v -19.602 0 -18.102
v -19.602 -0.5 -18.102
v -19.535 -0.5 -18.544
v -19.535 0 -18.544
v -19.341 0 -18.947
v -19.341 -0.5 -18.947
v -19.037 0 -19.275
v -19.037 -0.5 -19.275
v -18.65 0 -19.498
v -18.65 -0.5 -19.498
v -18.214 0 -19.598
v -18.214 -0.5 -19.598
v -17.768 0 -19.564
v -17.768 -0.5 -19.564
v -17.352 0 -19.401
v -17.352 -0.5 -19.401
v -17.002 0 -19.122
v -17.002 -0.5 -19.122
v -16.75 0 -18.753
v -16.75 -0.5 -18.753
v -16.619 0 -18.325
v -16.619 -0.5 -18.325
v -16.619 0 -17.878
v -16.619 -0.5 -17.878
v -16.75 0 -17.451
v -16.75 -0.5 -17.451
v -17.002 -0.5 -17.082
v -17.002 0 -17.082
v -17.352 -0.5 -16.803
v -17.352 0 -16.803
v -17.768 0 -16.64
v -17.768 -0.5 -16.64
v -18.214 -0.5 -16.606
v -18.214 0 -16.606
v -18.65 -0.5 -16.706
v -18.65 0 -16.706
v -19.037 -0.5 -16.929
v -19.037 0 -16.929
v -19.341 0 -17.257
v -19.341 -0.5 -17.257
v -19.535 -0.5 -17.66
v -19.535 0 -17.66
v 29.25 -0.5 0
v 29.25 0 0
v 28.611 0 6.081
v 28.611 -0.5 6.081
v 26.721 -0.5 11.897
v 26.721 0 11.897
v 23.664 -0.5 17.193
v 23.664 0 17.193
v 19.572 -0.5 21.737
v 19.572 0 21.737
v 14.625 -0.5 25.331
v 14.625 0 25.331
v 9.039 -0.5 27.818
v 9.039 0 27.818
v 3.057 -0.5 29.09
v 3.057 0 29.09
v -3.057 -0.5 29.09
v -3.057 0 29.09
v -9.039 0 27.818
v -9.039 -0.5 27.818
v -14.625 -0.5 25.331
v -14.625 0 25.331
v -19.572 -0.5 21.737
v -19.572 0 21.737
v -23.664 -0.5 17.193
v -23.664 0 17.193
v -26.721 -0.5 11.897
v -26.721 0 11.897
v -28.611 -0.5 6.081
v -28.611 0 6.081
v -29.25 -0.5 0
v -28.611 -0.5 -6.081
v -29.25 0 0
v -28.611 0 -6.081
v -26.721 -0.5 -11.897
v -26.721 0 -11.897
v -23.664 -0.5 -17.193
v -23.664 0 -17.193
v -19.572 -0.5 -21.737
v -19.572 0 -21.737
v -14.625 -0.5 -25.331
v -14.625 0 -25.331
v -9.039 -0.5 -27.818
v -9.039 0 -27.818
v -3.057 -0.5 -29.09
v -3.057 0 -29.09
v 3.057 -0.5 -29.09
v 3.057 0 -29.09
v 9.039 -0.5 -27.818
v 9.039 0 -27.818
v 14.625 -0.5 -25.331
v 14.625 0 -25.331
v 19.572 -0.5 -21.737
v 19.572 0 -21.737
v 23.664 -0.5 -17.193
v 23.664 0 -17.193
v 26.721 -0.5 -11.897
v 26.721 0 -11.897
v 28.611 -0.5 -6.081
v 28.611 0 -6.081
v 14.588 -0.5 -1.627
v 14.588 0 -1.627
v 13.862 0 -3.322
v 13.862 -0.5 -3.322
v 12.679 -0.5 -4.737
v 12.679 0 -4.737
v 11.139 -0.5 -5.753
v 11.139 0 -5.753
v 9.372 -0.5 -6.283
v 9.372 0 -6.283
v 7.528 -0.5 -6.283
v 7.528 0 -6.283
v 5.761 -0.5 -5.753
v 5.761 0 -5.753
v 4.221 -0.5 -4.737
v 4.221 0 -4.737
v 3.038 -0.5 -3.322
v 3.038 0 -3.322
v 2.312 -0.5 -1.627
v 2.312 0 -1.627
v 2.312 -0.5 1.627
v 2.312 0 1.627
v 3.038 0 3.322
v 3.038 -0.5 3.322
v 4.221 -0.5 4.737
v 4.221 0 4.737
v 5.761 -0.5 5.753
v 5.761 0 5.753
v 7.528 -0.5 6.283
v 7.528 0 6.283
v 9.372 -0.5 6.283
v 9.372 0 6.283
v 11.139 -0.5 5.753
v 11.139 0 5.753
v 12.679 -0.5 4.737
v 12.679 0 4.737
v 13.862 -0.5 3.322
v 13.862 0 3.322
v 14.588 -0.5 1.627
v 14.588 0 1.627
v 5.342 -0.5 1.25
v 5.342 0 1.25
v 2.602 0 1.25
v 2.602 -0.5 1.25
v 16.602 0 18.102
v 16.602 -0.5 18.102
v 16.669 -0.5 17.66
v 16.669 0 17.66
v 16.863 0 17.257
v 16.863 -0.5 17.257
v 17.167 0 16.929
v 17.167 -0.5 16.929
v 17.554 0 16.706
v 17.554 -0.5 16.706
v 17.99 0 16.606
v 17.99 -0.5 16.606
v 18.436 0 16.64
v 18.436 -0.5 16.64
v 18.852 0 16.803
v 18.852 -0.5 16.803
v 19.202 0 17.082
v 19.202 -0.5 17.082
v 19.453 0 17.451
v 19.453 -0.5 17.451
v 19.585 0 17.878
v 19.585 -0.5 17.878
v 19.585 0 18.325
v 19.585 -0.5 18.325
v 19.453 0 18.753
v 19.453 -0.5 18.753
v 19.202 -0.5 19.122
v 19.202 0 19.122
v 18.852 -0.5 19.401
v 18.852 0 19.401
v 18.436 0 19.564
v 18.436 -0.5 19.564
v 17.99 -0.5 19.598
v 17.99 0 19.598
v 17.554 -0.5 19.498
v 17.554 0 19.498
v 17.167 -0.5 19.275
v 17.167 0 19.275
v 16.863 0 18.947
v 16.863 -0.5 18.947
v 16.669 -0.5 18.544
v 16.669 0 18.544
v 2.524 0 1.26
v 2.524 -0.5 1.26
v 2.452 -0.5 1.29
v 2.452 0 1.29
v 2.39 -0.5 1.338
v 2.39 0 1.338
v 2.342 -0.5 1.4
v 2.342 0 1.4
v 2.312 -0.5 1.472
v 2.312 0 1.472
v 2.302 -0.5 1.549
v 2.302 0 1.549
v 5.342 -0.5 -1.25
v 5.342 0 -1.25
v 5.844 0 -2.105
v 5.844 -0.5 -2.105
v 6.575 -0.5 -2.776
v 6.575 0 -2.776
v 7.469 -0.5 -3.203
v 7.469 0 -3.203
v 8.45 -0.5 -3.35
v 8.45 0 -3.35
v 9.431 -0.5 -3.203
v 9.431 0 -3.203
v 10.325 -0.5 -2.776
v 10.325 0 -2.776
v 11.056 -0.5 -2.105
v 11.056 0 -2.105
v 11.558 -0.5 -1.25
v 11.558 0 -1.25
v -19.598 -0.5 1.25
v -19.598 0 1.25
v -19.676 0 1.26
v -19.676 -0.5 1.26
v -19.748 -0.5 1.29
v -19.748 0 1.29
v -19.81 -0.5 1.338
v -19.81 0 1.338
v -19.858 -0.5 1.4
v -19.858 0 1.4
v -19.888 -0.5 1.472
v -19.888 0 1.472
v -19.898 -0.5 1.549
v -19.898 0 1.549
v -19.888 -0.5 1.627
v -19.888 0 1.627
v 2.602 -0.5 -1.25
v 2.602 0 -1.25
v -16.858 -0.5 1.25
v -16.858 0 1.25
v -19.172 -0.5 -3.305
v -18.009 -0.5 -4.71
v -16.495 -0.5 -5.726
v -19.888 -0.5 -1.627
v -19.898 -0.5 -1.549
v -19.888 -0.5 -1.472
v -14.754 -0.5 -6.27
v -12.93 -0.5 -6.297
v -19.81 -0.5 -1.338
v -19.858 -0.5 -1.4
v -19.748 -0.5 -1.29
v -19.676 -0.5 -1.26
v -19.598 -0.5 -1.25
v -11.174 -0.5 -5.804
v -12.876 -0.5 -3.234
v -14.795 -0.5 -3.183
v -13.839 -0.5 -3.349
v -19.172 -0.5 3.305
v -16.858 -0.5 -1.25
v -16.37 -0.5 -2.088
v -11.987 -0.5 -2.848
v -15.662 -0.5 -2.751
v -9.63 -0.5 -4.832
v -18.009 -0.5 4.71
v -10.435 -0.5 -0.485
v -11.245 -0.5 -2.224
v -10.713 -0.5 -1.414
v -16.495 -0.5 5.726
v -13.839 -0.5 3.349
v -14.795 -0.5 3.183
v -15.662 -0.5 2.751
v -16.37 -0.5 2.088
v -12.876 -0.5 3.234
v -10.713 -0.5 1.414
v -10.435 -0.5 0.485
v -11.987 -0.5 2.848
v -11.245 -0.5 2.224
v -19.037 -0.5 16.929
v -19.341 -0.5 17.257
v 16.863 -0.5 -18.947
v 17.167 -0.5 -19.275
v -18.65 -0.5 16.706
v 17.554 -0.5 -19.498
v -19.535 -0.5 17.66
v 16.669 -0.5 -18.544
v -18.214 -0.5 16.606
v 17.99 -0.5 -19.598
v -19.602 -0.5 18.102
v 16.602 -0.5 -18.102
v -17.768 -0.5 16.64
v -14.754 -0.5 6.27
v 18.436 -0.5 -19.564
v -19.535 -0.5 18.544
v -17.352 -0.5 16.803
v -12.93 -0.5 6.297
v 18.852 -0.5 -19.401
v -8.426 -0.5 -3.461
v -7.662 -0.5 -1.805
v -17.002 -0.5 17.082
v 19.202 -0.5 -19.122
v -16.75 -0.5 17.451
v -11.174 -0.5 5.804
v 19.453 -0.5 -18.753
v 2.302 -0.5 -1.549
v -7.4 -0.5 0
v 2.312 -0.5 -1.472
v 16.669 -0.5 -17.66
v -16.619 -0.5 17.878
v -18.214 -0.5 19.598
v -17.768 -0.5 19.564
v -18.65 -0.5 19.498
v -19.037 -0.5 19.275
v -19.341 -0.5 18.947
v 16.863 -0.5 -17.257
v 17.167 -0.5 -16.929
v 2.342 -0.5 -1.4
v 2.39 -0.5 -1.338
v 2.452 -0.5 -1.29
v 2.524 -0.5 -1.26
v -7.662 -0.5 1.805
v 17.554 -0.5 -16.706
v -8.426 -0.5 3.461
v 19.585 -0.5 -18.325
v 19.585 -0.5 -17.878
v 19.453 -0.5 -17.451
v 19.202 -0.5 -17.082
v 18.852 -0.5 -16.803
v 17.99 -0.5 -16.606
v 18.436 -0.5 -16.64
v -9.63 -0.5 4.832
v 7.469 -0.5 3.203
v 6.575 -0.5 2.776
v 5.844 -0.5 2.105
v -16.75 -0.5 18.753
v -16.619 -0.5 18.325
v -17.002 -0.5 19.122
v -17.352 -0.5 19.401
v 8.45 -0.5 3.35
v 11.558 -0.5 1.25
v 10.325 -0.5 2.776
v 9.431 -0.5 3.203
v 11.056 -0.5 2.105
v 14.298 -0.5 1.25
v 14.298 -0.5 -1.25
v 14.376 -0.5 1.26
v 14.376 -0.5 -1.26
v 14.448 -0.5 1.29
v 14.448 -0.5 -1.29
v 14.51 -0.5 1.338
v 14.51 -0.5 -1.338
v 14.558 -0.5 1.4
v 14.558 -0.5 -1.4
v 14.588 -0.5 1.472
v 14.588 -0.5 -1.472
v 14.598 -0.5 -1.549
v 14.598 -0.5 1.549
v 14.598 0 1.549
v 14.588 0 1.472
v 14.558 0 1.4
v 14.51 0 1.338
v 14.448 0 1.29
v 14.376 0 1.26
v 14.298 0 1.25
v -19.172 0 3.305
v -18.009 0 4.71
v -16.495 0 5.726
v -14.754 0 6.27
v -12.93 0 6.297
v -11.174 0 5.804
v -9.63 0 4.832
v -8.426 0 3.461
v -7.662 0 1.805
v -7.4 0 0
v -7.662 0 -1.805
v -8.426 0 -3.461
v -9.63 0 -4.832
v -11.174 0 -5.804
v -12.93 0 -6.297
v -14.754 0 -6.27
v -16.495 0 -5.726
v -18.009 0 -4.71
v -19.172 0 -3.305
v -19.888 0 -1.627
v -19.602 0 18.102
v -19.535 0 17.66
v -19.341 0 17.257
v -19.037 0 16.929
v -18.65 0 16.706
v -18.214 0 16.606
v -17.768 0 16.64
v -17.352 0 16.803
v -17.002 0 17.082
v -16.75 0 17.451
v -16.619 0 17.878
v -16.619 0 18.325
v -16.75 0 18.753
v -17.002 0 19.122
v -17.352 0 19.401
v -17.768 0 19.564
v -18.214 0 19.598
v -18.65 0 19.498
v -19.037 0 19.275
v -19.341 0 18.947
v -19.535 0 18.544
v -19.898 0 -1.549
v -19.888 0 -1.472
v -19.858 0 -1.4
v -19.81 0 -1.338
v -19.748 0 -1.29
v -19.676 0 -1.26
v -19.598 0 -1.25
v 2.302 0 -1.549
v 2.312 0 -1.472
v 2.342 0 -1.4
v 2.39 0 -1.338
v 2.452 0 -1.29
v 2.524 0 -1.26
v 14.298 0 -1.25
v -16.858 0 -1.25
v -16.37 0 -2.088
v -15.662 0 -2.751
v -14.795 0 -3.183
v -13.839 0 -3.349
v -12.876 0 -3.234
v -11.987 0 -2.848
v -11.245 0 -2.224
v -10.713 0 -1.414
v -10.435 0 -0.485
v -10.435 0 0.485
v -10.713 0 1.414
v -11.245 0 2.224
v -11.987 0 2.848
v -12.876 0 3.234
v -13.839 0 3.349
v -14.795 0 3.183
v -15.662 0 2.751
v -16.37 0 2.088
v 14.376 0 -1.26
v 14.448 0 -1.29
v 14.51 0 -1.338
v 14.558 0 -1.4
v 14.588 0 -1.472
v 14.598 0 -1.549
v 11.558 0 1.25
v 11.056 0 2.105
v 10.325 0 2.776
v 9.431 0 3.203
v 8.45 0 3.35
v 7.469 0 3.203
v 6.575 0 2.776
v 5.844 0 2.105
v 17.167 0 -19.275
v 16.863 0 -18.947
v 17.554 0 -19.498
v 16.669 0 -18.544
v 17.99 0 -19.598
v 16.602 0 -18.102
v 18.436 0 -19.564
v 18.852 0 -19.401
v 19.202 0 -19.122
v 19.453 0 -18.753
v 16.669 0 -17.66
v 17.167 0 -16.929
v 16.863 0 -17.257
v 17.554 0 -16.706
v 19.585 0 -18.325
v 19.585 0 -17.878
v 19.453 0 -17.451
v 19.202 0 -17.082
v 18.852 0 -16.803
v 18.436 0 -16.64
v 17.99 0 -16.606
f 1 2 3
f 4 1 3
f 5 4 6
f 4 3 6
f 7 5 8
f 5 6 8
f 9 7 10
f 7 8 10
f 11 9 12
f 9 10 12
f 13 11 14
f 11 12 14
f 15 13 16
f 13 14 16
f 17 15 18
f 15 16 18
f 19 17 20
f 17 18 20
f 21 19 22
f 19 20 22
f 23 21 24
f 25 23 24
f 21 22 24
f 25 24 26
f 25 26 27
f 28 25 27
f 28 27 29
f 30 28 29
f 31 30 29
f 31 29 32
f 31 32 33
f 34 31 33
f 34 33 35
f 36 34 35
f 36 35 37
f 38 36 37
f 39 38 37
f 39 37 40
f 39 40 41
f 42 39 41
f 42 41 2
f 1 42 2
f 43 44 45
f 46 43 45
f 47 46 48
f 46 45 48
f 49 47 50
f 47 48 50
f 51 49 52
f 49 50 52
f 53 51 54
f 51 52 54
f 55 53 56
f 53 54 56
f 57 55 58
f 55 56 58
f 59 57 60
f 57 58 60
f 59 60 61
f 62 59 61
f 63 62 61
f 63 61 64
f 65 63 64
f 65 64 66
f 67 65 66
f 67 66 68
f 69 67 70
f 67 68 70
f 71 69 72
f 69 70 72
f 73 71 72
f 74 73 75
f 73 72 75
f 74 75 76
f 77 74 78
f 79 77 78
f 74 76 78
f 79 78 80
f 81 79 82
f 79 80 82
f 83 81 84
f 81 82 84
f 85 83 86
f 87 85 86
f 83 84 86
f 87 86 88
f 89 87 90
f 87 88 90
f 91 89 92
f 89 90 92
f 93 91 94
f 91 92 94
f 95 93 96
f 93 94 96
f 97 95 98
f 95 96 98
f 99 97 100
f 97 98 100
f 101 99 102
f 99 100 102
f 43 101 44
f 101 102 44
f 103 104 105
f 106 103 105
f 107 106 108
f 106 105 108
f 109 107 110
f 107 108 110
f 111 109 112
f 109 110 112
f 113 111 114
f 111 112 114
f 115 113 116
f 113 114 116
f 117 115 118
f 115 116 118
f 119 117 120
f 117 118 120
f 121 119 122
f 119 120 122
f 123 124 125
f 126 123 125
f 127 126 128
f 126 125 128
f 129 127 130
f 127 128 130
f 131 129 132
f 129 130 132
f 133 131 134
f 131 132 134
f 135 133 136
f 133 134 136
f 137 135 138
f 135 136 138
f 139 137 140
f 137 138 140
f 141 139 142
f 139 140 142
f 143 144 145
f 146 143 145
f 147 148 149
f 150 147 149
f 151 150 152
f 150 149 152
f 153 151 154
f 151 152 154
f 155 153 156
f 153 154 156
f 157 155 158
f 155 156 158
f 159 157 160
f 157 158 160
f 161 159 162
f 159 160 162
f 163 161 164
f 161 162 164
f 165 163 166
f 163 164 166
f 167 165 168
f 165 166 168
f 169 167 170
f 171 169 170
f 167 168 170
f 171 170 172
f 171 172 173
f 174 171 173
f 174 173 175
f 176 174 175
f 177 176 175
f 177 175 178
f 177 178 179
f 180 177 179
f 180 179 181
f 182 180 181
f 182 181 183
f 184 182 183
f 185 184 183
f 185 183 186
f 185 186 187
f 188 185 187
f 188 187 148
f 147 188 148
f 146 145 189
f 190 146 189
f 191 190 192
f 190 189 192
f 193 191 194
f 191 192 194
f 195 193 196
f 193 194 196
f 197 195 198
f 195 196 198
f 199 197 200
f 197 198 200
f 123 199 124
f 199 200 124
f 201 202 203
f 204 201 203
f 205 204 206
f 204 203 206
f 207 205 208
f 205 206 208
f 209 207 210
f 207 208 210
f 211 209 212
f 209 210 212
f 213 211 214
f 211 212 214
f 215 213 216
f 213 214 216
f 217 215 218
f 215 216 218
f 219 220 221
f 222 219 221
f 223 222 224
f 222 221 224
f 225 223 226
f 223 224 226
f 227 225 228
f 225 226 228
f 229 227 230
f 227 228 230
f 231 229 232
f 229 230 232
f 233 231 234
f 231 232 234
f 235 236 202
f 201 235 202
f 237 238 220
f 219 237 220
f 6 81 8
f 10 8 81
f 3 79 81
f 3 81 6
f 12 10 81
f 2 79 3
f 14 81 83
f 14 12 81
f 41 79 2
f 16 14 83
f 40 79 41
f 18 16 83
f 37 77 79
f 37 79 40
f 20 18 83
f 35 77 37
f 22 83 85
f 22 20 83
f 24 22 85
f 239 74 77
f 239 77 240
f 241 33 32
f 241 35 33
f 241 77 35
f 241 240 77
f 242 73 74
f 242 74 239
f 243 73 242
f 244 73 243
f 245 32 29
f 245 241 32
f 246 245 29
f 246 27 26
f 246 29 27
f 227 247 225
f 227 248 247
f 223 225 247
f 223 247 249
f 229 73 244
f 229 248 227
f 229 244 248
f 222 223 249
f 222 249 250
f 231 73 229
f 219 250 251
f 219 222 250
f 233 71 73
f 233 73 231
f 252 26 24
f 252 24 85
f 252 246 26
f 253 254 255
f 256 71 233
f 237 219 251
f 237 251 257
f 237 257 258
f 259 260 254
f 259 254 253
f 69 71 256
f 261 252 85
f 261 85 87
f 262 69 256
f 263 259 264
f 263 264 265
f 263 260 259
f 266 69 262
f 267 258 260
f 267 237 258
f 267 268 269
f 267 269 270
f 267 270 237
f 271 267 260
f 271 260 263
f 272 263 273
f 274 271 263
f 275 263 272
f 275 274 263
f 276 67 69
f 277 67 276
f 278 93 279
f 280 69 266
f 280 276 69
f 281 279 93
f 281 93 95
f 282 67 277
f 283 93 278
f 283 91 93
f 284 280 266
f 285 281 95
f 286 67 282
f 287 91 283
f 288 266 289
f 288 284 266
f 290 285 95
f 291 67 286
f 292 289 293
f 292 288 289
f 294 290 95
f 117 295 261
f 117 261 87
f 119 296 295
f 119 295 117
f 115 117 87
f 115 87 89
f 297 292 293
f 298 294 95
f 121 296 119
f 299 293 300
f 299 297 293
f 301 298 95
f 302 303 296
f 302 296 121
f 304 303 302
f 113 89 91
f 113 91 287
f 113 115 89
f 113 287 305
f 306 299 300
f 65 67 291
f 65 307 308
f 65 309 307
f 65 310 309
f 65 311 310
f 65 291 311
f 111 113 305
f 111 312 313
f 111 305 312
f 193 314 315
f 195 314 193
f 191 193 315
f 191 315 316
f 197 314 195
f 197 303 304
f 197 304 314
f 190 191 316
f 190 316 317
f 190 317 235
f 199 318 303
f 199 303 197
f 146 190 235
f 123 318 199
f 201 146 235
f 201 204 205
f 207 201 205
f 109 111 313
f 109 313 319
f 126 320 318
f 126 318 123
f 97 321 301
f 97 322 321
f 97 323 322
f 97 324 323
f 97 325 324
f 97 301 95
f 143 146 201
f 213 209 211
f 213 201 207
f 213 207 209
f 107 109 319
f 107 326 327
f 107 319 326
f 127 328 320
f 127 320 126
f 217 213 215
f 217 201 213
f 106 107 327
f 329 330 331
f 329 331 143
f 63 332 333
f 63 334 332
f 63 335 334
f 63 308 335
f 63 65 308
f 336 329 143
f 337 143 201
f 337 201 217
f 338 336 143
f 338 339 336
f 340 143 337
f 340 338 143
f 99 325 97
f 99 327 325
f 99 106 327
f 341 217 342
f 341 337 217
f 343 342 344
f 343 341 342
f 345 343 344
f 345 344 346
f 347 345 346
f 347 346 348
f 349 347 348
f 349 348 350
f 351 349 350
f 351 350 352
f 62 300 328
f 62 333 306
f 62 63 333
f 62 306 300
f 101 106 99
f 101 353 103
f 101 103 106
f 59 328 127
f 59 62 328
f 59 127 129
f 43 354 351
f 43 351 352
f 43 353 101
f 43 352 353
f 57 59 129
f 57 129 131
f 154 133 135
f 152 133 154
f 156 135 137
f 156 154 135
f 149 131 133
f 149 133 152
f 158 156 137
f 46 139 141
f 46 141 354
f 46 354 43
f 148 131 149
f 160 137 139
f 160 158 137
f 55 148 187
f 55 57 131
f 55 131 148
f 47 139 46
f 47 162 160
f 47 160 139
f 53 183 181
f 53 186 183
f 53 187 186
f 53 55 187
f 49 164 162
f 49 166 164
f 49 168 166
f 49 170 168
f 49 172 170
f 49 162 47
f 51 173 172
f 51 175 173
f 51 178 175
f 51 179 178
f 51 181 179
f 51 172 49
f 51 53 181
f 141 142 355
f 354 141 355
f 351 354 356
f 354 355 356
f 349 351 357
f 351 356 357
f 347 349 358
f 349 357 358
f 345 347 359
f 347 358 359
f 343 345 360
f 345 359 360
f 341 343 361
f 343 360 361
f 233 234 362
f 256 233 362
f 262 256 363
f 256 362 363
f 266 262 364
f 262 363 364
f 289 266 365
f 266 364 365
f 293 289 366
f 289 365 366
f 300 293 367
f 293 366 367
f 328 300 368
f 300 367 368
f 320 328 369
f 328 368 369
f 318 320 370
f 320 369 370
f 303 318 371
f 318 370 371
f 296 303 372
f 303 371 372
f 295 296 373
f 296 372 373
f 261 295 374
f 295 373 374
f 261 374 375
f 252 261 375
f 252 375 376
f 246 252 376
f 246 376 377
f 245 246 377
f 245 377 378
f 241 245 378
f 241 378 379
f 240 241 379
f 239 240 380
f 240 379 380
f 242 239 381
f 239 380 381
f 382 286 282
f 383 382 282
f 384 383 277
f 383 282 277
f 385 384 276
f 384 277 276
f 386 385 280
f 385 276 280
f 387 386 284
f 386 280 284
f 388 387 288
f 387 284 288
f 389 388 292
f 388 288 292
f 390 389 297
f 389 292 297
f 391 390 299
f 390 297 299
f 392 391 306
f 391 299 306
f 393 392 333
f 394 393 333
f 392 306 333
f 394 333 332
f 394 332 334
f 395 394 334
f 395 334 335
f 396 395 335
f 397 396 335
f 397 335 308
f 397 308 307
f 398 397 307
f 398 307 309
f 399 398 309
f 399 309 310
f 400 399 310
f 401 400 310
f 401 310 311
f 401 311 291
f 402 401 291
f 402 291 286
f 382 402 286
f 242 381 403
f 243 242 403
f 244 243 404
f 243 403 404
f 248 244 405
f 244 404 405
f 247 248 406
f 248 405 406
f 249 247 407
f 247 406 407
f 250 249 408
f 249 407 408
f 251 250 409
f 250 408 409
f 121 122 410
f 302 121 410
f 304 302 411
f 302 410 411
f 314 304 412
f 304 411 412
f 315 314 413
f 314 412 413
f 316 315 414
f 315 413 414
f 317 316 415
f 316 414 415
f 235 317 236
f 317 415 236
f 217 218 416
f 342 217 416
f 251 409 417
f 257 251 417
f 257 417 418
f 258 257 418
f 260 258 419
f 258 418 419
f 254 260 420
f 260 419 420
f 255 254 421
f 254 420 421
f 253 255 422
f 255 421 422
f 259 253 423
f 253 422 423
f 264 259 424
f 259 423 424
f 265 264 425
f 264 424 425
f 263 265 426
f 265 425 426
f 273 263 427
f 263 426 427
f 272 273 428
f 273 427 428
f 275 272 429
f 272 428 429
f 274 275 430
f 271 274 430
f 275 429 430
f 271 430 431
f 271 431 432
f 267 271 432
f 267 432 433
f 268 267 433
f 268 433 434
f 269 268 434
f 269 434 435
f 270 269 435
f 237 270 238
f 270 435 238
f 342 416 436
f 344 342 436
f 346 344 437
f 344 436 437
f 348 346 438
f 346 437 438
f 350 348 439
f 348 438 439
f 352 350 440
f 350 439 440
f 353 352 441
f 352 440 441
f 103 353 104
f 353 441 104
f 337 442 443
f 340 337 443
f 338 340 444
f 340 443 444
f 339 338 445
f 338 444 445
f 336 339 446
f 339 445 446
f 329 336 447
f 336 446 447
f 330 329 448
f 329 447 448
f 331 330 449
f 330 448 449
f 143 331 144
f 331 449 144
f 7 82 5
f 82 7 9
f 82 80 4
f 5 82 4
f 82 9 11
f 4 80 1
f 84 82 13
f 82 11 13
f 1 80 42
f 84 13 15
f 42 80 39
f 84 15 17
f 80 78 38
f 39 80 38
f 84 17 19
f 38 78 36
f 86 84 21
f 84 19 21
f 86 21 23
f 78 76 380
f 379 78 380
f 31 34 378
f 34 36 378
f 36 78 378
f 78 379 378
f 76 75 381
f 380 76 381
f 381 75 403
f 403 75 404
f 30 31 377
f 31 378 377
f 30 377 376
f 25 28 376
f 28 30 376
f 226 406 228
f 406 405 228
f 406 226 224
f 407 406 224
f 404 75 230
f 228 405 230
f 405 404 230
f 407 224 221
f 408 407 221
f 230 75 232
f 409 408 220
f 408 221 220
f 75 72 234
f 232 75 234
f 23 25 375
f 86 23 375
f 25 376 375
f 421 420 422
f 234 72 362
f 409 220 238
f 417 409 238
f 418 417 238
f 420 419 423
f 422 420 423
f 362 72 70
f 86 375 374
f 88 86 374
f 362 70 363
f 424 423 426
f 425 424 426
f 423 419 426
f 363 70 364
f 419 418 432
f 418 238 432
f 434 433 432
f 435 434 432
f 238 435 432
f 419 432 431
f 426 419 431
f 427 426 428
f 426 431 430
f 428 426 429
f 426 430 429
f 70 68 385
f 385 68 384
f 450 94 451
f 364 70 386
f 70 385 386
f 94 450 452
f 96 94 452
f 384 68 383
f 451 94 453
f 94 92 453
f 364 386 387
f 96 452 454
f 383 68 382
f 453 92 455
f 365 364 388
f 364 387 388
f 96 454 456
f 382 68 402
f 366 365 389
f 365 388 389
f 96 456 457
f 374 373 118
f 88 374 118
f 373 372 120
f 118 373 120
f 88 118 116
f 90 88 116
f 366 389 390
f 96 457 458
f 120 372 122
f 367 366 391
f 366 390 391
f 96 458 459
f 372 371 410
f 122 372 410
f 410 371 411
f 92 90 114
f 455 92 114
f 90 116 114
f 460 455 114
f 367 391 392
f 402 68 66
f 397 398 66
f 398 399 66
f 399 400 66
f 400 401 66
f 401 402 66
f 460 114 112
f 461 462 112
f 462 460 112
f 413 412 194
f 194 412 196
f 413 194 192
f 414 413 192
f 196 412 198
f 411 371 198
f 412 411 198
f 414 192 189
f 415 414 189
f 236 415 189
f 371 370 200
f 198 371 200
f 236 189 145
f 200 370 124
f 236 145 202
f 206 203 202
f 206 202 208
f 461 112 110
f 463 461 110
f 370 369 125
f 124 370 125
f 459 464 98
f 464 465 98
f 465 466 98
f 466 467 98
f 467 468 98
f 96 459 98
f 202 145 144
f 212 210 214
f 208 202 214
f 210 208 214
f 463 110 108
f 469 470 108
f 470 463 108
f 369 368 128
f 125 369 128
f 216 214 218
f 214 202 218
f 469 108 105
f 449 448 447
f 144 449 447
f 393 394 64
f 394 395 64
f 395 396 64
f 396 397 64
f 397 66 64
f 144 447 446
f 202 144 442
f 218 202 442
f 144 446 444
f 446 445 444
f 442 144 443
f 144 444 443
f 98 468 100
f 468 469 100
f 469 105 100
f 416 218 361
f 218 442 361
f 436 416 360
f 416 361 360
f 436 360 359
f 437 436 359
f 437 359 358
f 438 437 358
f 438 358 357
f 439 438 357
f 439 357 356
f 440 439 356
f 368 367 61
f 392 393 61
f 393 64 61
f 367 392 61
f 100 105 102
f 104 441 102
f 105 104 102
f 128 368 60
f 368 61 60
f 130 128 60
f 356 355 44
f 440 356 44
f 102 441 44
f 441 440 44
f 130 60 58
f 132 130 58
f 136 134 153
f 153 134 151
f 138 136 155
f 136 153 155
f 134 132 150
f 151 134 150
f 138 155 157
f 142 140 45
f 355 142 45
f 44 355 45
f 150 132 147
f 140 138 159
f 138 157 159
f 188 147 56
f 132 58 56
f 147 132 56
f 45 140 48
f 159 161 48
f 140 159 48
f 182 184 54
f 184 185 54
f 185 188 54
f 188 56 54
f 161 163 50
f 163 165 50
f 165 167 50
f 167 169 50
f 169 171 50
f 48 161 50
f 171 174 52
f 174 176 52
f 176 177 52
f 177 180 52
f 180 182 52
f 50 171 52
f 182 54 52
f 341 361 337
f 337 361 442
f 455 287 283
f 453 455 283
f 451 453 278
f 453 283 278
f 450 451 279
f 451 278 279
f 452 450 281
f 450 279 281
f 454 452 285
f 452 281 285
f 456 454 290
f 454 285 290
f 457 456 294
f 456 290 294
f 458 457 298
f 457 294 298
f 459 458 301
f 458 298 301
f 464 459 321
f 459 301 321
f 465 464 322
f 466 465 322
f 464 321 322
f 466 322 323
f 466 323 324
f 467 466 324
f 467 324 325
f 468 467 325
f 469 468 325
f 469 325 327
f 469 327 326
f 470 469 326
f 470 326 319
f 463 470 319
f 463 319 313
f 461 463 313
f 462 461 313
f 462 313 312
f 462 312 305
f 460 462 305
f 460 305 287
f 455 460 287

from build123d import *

# Parameters (mm, degrees)
F0_R     = 29.25
F1_DEPTH = 0.5
F2_D     = 3


with BuildPart() as f1:
    # F0 (on Front) → F1 (new body)
    with BuildSketch(Plane.XZ):
        Circle(F0_R)
        with BuildLine():
            ThreePointArc((14.588064, -1.62686), (8.45, -6.35), (2.311936, -1.62686))
            ThreePointArc((2.311936, -1.62686), (2.364165, -1.367049), (2.601923, -1.25))
            Line((2.601923, -1.25), (5.341946, -1.25))
            ThreePointArc((5.341946, -1.25), (8.45, -3.35), (11.558054, -1.25))
            Line((11.558054, -1.25), (14.298077, -1.25))
            ThreePointArc((14.298077, -1.25), (14.535835, -1.367049), (14.588064, -1.62686))
        make_face(mode=Mode.SUBTRACT)
        with BuildLine():
            ThreePointArc((-19.888064, 1.62686), (-7.4, 0), (-19.888064, -1.62686))
            ThreePointArc((-19.888064, -1.62686), (-19.835835, -1.367049), (-19.598077, -1.25))
            Line((-19.598077, -1.25), (-16.858054, -1.25))
            ThreePointArc((-16.858054, -1.25), (-10.4, 0), (-16.858054, 1.25))
            Line((-16.858054, 1.25), (-19.598077, 1.25))
            ThreePointArc((-19.598077, 1.25), (-19.835835, 1.367049), (-19.888064, 1.62686))
        make_face(mode=Mode.SUBTRACT)
        with BuildLine():
            Line((5.341946, 1.25), (2.601923, 1.25))
            ThreePointArc((2.601923, 1.25), (2.364165, 1.367049), (2.311936, 1.62686))
            ThreePointArc((2.311936, 1.62686), (8.45, 6.35), (14.588064, 1.62686))
            ThreePointArc((14.588064, 1.62686), (14.535835, 1.367049), (14.298077, 1.25))
            Line((14.298077, 1.25), (11.558054, 1.25))
            ThreePointArc((11.558054, 1.25), (8.45, 3.35), (5.341946, 1.25))
        make_face(mode=Mode.SUBTRACT)
    extrude(amount=F1_DEPTH)

    # F2 (through all)
    with Locations(Plane(origin=(0, 0, 0), x_dir=(1, 0, 0), z_dir=(0, 1, 0))):
        with Locations((-18.101934, 18.101934), (18.101934, 18.101934), (18.101934, -18.101934), (-18.101934, -18.101934)):
            Hole(F2_D / 2)


solid = f1.part
